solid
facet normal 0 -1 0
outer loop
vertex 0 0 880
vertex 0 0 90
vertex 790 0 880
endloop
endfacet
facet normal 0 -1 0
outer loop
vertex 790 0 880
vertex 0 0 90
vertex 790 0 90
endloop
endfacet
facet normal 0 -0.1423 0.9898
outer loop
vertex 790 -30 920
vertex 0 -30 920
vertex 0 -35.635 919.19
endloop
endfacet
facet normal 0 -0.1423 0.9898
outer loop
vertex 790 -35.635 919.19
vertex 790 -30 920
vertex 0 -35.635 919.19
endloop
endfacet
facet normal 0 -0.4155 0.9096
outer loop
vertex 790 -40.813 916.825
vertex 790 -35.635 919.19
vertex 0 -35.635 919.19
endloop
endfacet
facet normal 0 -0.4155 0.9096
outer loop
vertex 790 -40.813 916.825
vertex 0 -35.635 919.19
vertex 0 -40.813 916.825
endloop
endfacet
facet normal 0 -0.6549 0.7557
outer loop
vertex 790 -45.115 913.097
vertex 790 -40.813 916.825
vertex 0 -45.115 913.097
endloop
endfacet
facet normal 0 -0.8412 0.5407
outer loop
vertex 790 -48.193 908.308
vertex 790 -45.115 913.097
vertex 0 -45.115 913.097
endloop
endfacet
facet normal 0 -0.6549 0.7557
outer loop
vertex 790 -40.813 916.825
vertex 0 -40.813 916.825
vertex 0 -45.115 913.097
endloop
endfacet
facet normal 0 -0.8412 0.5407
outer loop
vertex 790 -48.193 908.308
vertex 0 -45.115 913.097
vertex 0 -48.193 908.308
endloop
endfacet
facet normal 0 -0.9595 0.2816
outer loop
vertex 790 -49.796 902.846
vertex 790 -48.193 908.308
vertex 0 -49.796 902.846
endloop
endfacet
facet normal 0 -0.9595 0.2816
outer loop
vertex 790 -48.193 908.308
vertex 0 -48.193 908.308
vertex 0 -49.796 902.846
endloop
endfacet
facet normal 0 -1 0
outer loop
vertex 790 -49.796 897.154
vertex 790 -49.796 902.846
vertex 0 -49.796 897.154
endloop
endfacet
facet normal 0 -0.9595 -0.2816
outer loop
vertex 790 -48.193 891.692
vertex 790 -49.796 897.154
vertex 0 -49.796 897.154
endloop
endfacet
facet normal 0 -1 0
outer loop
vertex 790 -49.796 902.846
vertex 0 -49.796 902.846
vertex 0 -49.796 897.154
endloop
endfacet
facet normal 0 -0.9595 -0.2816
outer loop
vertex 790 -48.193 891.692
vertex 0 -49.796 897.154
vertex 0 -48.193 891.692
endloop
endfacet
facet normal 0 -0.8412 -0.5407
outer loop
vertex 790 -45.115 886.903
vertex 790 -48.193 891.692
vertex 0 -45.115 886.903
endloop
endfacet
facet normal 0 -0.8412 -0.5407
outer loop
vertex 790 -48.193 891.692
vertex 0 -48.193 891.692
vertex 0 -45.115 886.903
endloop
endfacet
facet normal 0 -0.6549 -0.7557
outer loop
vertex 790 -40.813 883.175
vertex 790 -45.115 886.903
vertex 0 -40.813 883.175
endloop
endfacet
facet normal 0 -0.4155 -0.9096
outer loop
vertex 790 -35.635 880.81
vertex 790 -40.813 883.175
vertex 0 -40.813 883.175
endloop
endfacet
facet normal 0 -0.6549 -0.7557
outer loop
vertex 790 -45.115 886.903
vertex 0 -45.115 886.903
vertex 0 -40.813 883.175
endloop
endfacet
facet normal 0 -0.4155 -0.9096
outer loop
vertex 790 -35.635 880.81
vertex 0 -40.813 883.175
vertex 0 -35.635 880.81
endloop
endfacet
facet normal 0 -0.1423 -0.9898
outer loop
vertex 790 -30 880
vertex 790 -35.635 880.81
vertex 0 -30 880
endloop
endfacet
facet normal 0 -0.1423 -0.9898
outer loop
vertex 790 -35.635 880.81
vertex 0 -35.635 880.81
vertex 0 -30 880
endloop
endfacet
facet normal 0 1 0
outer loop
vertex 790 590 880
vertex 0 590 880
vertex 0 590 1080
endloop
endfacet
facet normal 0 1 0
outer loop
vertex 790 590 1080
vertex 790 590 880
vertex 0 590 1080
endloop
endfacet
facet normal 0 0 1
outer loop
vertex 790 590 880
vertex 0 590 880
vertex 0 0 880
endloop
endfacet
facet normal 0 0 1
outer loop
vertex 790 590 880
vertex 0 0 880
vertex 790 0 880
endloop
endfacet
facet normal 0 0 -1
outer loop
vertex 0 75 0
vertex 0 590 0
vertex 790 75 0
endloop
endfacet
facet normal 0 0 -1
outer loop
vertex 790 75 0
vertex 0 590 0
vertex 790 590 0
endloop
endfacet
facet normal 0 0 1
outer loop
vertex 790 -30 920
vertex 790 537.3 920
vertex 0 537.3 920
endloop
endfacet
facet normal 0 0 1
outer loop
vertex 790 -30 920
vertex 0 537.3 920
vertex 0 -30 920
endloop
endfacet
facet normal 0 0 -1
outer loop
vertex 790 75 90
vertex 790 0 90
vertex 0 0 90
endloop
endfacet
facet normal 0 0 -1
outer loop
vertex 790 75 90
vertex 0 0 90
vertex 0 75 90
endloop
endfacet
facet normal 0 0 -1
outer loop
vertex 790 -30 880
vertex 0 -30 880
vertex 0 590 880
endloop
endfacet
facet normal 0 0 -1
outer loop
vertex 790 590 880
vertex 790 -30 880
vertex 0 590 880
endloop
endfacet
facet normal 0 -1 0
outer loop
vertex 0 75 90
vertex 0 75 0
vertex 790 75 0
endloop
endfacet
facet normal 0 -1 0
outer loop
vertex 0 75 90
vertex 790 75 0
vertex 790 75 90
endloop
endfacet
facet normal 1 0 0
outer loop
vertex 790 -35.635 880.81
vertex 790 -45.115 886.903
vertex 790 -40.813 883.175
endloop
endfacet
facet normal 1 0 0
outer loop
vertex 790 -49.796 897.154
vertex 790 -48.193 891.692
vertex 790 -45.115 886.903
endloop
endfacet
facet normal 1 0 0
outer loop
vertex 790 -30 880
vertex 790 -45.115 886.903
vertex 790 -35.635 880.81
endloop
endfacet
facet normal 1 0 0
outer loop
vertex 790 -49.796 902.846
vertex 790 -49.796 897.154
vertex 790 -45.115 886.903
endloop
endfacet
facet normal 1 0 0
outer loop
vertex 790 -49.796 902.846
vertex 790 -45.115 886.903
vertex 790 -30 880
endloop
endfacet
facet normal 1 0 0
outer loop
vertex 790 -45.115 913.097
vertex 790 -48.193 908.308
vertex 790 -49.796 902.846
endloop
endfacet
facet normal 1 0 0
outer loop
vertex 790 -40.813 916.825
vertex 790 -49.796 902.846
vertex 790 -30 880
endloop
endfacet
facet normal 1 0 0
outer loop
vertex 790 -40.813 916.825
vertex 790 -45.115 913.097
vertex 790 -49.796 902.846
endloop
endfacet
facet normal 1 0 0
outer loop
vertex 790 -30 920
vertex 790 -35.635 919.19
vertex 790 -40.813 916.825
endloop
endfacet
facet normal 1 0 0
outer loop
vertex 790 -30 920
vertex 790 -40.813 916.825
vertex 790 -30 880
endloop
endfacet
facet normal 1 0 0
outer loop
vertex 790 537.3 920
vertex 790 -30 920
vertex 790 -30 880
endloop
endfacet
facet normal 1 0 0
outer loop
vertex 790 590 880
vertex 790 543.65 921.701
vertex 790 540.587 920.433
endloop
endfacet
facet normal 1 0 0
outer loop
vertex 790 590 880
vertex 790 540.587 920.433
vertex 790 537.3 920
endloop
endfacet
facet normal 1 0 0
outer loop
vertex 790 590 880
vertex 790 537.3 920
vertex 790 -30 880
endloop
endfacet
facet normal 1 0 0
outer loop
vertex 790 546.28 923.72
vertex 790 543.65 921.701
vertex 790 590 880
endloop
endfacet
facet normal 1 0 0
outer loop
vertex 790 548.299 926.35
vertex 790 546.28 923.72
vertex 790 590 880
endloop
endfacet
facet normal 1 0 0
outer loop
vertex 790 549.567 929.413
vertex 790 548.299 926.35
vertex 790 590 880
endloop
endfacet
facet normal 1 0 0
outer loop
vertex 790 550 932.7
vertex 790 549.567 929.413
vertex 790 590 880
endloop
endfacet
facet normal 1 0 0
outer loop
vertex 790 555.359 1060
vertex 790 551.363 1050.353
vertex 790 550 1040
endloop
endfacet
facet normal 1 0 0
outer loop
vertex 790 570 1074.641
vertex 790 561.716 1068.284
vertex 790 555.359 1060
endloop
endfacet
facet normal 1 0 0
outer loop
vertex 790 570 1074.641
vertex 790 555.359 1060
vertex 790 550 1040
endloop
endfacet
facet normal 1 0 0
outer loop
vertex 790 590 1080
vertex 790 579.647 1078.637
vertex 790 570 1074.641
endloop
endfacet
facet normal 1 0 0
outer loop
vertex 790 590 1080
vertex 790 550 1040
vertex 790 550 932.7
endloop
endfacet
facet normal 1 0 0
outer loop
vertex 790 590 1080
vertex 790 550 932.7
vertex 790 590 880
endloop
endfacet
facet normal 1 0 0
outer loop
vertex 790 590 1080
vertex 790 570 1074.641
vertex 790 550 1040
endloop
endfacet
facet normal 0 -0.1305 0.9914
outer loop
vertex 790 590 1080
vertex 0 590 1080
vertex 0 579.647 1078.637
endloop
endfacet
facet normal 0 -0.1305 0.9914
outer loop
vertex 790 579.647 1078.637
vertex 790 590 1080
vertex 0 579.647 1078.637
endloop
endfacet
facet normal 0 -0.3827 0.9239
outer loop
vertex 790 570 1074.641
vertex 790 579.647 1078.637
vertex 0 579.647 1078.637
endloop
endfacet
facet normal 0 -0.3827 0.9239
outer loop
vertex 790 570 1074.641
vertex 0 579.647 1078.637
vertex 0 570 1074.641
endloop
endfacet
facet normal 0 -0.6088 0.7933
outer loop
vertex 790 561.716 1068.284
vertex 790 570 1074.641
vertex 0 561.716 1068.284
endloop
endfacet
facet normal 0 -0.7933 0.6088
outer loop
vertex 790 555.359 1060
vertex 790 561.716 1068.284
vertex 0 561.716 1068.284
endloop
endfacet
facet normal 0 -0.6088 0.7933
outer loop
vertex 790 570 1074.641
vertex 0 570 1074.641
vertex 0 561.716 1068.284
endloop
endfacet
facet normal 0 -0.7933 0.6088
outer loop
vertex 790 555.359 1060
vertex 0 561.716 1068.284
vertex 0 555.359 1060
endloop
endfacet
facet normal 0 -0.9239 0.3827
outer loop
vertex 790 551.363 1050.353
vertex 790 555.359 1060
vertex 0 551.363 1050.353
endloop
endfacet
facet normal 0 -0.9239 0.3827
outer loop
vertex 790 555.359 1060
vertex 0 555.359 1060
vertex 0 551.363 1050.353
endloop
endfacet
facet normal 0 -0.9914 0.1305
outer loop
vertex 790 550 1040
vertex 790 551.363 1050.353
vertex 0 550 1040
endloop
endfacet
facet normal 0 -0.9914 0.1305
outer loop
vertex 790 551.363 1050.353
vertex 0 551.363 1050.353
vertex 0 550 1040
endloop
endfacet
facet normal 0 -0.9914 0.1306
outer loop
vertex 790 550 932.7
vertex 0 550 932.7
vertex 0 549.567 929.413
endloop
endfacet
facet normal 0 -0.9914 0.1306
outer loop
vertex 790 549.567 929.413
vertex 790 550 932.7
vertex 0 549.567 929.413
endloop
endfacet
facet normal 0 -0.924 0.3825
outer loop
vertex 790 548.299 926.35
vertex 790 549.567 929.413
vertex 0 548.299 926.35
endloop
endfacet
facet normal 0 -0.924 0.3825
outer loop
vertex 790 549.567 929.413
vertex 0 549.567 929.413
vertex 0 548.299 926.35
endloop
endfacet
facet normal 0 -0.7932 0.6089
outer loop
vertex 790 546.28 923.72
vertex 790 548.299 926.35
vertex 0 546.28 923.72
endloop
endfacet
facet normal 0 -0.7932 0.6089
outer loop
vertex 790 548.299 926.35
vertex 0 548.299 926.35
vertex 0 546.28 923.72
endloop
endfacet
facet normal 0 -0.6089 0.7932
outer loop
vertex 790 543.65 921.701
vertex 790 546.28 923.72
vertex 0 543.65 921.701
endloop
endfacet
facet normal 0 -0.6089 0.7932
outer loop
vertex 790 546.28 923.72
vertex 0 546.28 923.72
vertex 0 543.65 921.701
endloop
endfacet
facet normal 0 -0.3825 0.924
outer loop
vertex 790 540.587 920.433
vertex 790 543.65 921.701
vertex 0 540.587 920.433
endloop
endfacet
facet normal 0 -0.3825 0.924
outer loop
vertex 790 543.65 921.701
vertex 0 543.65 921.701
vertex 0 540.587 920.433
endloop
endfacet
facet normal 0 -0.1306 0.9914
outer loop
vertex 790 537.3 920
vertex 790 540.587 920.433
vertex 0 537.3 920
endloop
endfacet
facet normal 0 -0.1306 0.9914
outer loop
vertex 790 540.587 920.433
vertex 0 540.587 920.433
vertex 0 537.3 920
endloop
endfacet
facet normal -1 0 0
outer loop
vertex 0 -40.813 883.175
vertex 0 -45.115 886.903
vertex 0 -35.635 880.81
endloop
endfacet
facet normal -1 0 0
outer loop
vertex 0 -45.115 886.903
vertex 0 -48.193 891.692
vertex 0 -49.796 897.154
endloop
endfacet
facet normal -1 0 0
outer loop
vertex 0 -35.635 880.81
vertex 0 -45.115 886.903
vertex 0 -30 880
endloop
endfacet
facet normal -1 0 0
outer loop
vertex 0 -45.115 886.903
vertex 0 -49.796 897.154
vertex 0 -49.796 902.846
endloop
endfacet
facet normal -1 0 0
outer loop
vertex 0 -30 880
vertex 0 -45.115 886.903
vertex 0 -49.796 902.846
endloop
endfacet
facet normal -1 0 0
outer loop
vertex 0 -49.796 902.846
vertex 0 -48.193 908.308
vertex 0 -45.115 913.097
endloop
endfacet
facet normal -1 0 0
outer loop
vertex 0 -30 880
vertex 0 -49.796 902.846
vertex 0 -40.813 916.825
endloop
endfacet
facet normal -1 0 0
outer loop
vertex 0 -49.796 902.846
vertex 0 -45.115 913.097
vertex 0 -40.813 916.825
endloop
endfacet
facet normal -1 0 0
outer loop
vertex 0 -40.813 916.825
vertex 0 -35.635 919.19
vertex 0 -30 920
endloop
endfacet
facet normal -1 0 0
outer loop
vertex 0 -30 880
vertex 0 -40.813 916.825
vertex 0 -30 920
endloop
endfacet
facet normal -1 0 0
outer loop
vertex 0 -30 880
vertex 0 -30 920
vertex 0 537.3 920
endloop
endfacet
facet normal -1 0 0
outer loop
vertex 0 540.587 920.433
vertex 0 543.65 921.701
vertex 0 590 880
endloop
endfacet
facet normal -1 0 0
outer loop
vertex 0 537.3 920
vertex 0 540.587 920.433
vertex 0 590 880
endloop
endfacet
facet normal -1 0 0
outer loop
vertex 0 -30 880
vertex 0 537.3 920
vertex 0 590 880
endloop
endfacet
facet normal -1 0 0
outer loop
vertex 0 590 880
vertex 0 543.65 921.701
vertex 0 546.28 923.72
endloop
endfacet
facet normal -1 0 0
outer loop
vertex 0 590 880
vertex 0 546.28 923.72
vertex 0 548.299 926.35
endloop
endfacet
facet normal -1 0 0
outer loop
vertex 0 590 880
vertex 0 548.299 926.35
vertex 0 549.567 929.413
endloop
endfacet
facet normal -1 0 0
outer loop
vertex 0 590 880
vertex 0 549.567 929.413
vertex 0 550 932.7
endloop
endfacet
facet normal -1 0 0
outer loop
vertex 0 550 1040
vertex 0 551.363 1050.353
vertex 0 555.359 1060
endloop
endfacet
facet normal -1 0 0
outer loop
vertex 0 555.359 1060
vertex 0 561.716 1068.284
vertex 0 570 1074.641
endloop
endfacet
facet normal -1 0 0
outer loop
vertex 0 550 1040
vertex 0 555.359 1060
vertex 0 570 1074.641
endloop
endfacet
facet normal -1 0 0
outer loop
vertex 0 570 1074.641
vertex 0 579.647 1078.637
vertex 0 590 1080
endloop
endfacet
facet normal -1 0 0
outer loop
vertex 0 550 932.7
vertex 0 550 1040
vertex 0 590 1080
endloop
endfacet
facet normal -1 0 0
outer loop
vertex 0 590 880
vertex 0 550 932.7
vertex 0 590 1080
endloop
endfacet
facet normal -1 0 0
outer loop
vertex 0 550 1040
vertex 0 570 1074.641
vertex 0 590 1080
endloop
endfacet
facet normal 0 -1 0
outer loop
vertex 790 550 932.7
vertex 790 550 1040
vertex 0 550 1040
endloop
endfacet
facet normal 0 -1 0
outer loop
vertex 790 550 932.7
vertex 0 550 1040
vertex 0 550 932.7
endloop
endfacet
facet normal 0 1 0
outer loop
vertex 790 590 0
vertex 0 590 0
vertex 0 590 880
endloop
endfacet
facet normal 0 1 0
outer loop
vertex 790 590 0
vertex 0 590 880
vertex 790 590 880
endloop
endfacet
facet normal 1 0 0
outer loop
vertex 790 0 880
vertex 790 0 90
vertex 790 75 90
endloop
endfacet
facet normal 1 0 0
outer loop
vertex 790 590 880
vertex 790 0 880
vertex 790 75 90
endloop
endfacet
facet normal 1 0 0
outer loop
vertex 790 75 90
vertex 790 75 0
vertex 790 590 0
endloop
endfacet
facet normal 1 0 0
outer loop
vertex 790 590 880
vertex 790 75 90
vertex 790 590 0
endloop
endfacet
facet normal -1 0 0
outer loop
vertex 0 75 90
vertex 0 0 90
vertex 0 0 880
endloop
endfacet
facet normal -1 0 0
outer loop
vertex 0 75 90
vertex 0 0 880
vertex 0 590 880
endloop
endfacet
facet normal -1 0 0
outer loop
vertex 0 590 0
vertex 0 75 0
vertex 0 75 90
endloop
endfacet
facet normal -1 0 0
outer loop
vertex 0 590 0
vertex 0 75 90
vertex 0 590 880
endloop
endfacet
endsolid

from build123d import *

# Parameters (mm, degrees)
F0_W     = 790
F0_H     = 590
F1_DEPTH = 880
F2_W     = 75
F2_H     = 90
F3_DEPTH = 790.001
F5_DEPTH = 790


with BuildPart() as f1:
    # F0 (on Top) → F1 (new body)
    with BuildSketch(Plane.XY):
        with Locations((395, 295)):
            Rectangle(F0_W, F0_H)
    extrude(amount=F1_DEPTH)

    # F2 (on Right) → F3 (cut, through all)
    with BuildSketch(Plane.YZ):
        with Locations((37.5, 45)):
            Rectangle(F2_W, F2_H)
    extrude(amount=F3_DEPTH, mode=Mode.SUBTRACT)


with BuildPart() as f5:
    # F4 (on Right) → F5 (new body, through all)
    with BuildSketch(Plane.YZ):
        with BuildLine():
            Line((-30, 880), (590, 880))
            Line((590, 880), (590, 1080))
            ThreePointArc((590, 1080), (561.715729, 1068.284271), (550, 1040))
            Line((550, 1040), (550, 932.7))
            ThreePointArc((550, 932.7), (546.280256, 923.719744), (537.3, 920))
            Line((537.3, 920), (-30, 920))
            ThreePointArc((-30, 920), (-50, 900), (-30, 880))
        make_face()
    extrude(amount=F5_DEPTH)


solid = Compound([f1.part, f5.part])
